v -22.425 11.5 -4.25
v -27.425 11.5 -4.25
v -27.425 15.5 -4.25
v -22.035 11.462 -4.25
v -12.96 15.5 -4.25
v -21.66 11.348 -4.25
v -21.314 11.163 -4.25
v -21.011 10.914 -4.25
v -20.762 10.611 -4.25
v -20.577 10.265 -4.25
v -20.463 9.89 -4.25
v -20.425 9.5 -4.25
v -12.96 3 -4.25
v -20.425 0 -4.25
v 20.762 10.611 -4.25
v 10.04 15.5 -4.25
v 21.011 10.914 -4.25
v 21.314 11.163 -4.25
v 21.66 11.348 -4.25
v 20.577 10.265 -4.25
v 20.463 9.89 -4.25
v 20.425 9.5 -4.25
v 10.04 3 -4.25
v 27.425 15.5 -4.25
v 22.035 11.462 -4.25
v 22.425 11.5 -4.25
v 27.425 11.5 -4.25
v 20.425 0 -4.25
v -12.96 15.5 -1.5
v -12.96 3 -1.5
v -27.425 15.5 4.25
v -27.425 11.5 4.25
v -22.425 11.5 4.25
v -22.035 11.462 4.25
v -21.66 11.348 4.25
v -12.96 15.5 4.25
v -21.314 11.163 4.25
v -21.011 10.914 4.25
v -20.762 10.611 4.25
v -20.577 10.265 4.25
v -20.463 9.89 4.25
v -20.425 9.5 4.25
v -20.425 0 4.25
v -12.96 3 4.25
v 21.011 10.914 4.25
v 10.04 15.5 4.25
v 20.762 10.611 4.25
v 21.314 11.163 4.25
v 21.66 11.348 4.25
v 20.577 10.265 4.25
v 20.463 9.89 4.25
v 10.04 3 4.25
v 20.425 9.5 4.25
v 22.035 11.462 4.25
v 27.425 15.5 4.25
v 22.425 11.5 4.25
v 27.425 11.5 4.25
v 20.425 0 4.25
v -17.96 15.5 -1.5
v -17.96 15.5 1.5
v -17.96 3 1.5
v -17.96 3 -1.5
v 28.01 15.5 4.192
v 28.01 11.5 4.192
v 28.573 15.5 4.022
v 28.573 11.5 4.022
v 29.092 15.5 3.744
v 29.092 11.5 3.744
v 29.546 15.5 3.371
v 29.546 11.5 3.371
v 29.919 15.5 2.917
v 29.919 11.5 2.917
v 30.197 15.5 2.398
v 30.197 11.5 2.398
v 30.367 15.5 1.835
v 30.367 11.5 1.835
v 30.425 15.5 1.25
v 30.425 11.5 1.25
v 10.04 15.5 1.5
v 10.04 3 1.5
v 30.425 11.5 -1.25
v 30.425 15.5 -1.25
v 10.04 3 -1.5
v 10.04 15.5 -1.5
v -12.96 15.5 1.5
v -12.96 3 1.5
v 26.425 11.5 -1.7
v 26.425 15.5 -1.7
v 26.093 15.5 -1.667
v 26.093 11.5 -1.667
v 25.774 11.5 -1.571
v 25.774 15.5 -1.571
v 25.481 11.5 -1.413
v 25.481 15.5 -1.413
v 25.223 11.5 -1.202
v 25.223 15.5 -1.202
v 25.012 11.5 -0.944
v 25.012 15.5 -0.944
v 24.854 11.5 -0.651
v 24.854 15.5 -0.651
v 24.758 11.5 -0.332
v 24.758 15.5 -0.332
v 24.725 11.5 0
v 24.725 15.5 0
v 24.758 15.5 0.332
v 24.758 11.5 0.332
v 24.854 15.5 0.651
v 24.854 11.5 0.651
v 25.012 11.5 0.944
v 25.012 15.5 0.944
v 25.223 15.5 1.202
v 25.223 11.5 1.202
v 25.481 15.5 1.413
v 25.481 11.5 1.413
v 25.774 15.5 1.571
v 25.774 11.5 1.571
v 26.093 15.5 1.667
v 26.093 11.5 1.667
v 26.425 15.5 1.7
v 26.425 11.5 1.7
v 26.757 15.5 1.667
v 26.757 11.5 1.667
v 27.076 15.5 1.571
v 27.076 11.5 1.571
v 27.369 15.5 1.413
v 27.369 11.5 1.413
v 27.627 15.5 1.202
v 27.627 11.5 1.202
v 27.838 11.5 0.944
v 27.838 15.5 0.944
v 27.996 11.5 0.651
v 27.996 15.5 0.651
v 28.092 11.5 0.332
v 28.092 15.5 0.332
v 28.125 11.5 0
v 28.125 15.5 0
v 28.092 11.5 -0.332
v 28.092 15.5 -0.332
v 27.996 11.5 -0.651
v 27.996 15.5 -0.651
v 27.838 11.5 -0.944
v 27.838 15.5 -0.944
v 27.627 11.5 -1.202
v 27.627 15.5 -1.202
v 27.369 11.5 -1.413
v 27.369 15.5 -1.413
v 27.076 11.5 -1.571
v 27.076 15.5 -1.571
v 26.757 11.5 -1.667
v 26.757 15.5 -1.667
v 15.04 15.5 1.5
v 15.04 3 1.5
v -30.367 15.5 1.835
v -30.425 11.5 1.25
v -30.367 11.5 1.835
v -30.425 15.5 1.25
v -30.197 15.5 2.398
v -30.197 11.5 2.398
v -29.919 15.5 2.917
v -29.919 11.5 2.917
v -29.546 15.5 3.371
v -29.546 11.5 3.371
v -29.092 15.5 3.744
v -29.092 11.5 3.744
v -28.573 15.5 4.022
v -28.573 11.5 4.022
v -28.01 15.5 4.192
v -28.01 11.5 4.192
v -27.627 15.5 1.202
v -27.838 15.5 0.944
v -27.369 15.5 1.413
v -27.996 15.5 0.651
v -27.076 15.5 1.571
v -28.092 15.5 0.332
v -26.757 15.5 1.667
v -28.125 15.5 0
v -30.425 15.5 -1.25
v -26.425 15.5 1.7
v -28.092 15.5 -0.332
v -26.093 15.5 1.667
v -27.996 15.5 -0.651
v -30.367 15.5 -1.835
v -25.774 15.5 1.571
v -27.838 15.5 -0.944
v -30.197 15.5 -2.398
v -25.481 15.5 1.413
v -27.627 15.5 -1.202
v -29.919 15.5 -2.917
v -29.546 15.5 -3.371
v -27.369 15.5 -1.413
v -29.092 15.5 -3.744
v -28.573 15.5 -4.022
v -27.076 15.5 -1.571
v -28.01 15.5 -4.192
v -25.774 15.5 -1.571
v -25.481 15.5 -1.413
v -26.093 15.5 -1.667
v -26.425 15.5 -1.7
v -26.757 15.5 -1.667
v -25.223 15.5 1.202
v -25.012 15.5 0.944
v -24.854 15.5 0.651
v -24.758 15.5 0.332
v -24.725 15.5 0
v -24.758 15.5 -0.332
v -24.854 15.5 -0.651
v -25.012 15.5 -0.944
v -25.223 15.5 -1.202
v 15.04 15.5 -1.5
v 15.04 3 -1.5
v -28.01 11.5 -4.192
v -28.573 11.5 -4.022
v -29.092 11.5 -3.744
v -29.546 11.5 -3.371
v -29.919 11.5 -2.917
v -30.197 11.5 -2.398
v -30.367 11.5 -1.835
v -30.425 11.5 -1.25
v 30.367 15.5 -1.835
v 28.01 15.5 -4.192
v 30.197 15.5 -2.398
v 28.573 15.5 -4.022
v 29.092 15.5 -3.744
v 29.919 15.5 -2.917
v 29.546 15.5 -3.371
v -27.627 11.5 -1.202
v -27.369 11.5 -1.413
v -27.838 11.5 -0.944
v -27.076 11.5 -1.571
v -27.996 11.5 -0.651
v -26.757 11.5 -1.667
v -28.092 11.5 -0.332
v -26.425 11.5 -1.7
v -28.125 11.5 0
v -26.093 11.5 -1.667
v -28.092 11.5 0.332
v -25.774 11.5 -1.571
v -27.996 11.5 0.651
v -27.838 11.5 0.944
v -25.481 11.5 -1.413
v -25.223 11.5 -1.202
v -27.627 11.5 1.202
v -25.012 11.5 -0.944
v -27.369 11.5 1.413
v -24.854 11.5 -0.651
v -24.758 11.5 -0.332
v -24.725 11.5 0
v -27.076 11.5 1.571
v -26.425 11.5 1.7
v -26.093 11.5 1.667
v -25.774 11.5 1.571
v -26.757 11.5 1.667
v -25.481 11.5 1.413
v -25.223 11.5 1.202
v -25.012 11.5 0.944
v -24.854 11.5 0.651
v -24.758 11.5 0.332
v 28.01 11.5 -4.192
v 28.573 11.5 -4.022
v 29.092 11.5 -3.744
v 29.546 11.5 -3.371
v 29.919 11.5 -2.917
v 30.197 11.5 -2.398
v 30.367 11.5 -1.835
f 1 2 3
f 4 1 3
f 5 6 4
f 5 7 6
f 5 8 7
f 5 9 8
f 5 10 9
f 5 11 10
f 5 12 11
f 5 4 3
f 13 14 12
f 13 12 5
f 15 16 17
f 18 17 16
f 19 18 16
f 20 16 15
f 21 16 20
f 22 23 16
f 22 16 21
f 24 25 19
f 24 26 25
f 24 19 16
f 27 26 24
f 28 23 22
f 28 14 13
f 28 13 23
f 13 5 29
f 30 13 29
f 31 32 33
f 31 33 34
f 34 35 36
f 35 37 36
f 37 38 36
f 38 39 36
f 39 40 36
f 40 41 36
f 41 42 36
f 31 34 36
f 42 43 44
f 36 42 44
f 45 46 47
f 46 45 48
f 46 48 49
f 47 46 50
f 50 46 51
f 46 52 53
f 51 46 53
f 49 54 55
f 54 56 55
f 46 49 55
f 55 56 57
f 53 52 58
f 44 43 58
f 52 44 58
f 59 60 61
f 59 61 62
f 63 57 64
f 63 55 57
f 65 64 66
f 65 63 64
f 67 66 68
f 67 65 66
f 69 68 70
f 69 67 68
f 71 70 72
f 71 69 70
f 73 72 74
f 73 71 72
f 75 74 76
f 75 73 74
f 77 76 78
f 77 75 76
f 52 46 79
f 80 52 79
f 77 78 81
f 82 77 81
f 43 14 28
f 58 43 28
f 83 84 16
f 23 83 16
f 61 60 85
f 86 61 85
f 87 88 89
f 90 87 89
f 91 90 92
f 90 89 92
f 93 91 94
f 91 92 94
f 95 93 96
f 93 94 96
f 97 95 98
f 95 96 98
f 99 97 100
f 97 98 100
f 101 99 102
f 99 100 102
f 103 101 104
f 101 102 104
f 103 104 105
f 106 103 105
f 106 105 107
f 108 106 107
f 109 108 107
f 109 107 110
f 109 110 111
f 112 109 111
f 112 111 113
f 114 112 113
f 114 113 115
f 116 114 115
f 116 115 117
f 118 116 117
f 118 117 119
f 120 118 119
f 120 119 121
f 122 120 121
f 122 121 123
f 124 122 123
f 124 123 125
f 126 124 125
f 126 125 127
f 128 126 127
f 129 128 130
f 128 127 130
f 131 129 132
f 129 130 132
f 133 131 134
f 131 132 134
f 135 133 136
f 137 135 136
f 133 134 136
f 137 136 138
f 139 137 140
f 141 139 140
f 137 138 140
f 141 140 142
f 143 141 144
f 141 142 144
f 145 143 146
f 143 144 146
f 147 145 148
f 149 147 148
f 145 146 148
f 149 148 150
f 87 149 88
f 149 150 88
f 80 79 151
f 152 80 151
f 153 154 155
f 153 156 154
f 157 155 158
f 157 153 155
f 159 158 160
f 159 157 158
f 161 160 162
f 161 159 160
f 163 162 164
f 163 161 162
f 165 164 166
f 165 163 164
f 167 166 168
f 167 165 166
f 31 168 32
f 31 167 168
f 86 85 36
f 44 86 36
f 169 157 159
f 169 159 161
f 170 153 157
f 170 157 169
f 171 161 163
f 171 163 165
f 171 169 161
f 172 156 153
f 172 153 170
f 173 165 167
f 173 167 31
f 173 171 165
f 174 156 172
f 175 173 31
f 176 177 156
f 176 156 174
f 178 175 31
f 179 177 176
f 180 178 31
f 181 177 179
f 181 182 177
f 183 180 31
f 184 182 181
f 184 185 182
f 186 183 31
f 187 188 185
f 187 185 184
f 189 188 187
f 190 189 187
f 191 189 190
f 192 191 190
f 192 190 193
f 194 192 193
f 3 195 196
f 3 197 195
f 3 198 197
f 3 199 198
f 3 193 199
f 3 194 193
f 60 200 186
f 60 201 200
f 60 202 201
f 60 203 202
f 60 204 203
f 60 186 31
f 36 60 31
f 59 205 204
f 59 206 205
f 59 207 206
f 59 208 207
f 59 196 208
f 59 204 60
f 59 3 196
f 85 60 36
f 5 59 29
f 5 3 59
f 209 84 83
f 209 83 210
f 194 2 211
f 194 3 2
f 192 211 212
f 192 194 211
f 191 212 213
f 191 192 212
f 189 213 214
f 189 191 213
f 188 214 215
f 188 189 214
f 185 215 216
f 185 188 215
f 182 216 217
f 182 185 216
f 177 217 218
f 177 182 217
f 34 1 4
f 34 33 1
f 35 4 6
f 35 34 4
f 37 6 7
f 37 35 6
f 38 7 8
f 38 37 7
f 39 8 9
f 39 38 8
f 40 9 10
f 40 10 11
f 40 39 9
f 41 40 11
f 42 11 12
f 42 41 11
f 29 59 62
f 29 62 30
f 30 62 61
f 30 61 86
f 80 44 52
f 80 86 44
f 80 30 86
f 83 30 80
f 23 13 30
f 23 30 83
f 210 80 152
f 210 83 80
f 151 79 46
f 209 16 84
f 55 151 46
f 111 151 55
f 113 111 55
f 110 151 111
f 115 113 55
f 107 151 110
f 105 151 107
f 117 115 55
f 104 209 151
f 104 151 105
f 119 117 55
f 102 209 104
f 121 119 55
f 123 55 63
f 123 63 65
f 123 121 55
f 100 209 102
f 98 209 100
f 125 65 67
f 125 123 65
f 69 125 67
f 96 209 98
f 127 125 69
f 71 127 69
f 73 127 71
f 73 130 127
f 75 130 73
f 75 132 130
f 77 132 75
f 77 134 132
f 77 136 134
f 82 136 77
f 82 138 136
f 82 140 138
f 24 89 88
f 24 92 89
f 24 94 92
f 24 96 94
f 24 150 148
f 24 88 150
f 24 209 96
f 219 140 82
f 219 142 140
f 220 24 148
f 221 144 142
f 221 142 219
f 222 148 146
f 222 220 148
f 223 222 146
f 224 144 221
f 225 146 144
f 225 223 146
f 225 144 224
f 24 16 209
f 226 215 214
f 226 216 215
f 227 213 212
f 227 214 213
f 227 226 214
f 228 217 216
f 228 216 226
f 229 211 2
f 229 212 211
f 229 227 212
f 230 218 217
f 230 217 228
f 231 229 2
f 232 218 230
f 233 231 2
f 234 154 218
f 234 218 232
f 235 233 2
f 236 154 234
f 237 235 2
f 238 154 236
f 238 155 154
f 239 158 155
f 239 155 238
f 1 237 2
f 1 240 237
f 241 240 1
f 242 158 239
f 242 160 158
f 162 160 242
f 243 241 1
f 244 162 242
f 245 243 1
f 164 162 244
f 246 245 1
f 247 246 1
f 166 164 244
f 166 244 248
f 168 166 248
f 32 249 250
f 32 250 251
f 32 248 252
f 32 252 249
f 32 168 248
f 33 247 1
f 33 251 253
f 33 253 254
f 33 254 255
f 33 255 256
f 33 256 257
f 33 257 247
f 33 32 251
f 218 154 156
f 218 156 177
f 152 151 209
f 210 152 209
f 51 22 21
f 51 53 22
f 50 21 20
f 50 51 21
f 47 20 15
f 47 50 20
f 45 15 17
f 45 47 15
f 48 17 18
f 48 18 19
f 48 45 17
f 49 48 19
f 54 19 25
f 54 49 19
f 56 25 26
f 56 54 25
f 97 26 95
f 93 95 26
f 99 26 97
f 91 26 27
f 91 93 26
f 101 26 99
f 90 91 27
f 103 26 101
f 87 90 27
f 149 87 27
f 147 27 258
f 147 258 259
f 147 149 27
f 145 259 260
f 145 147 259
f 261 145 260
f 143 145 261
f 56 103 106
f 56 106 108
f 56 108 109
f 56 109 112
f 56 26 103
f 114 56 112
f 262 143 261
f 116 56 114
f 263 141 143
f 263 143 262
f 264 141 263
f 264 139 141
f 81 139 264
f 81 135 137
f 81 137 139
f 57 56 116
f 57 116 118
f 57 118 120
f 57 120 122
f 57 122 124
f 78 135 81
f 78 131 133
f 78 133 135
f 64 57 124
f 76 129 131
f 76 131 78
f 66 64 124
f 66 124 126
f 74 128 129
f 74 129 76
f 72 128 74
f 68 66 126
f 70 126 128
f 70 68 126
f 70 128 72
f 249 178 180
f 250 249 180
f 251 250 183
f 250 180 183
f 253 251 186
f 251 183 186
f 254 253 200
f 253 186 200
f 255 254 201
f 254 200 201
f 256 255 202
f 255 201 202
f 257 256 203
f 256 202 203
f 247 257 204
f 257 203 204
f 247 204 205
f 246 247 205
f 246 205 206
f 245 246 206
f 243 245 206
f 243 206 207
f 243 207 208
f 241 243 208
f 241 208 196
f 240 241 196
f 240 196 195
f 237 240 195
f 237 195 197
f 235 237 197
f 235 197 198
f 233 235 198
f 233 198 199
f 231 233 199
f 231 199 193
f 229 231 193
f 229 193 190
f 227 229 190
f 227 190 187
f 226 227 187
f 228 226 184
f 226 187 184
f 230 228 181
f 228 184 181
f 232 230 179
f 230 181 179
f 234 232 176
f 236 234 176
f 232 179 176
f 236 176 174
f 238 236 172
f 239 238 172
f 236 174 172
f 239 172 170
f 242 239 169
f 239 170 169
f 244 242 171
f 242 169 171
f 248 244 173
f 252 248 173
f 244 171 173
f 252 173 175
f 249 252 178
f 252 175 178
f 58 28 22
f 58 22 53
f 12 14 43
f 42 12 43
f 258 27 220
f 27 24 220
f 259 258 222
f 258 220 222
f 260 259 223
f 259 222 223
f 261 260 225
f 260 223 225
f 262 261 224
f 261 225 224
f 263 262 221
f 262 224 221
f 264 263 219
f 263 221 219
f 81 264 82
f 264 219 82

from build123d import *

# Parameters (mm, degrees)
SKETCH1_W           = 60.85
SKETCH1_H           = 8.5
BOSS_EXTRUDE1_DEPTH = 15.5
SKETCH4_R           = 1.7
CUT_EXTRUDE3_DEPTH  = 35.409201168
SKETCH2_W           = 5
SKETCH2_H           = 3
CUT_EXTRUDE1_DEPTH  = 12.5
SKETCH3_W           = 10
SKETCH3_H           = 8.5
CUT_EXTRUDE2_DEPTH  = 11.5
FILLET1_R           = 2
FILLET2_R           = 3


with BuildPart() as part:
    # Sketch1 → Boss-Extrude1 (new body)
    with BuildSketch(Plane(origin=(0, 0, 0), x_dir=(1, 0, 0), z_dir=(0, 1, 0))):
        Rectangle(SKETCH1_W, SKETCH1_H)
    extrude(amount=BOSS_EXTRUDE1_DEPTH)

    # Sketch4 → Cut-Extrude3 (cut, through all)
    with BuildSketch(Plane(origin=(0, 15.5, 0), x_dir=(1, 0, 0), z_dir=(0, 1, 0))):
        with Locations(Location((-26.425, 0, 0), (0, 0, 270))):
            Circle(SKETCH4_R)
        with Locations(Location((26.425, 0, 0), (0, 0, 90))):
            Circle(SKETCH4_R)
    extrude(amount=-CUT_EXTRUDE3_DEPTH, mode=Mode.SUBTRACT)

    # Sketch2 → Cut-Extrude1 (cut)
    with BuildSketch(Plane(origin=(0, 15.5, 0), x_dir=(1, 0, 0), z_dir=(0, 1, 0))):
        Polygon((-12.96, -1.5), (-12.96, -4.25), (10.04, -4.25), (10.04, -1.5), (10.04, 1.5), (10.04, 4.25), (-12.96, 4.25), (-12.96, 1.5), align=None)
        with Locations((-15.46, 0)):
            Rectangle(SKETCH2_W, SKETCH2_H)
        with Locations((12.54, 0)):
            Rectangle(SKETCH2_W, SKETCH2_H)
    extrude(amount=-CUT_EXTRUDE1_DEPTH, mode=Mode.SUBTRACT)

    # Sketch3 → Cut-Extrude2 (cut)
    with BuildSketch(Plane.XZ):
        with Locations((-25.425, 0)):
            Rectangle(SKETCH3_W, SKETCH3_H)
        with Locations((25.425, 0)):
            Rectangle(SKETCH3_W, SKETCH3_H)
    extrude(amount=-CUT_EXTRUDE2_DEPTH, mode=Mode.SUBTRACT)

    # Fillet1
    fillet1_edges = [part.edges().sort_by_distance(p)[0] for p in [
        (-20.425, 11.5, 0),
        (20.425, 11.5, 0),
    ]]
    fillet(fillet1_edges, radius=FILLET1_R)

    # Fillet2
    fillet2_edges = [part.edges().sort_by_distance(p)[0] for p in [
        (30.425, 13.5, 4.25),
        (-30.425, 13.5, 4.25),
        (-30.425, 13.5, -4.25),
        (30.425, 13.5, -4.25),
    ]]
    fillet(fillet2_edges, radius=FILLET2_R)


solid = part.part
